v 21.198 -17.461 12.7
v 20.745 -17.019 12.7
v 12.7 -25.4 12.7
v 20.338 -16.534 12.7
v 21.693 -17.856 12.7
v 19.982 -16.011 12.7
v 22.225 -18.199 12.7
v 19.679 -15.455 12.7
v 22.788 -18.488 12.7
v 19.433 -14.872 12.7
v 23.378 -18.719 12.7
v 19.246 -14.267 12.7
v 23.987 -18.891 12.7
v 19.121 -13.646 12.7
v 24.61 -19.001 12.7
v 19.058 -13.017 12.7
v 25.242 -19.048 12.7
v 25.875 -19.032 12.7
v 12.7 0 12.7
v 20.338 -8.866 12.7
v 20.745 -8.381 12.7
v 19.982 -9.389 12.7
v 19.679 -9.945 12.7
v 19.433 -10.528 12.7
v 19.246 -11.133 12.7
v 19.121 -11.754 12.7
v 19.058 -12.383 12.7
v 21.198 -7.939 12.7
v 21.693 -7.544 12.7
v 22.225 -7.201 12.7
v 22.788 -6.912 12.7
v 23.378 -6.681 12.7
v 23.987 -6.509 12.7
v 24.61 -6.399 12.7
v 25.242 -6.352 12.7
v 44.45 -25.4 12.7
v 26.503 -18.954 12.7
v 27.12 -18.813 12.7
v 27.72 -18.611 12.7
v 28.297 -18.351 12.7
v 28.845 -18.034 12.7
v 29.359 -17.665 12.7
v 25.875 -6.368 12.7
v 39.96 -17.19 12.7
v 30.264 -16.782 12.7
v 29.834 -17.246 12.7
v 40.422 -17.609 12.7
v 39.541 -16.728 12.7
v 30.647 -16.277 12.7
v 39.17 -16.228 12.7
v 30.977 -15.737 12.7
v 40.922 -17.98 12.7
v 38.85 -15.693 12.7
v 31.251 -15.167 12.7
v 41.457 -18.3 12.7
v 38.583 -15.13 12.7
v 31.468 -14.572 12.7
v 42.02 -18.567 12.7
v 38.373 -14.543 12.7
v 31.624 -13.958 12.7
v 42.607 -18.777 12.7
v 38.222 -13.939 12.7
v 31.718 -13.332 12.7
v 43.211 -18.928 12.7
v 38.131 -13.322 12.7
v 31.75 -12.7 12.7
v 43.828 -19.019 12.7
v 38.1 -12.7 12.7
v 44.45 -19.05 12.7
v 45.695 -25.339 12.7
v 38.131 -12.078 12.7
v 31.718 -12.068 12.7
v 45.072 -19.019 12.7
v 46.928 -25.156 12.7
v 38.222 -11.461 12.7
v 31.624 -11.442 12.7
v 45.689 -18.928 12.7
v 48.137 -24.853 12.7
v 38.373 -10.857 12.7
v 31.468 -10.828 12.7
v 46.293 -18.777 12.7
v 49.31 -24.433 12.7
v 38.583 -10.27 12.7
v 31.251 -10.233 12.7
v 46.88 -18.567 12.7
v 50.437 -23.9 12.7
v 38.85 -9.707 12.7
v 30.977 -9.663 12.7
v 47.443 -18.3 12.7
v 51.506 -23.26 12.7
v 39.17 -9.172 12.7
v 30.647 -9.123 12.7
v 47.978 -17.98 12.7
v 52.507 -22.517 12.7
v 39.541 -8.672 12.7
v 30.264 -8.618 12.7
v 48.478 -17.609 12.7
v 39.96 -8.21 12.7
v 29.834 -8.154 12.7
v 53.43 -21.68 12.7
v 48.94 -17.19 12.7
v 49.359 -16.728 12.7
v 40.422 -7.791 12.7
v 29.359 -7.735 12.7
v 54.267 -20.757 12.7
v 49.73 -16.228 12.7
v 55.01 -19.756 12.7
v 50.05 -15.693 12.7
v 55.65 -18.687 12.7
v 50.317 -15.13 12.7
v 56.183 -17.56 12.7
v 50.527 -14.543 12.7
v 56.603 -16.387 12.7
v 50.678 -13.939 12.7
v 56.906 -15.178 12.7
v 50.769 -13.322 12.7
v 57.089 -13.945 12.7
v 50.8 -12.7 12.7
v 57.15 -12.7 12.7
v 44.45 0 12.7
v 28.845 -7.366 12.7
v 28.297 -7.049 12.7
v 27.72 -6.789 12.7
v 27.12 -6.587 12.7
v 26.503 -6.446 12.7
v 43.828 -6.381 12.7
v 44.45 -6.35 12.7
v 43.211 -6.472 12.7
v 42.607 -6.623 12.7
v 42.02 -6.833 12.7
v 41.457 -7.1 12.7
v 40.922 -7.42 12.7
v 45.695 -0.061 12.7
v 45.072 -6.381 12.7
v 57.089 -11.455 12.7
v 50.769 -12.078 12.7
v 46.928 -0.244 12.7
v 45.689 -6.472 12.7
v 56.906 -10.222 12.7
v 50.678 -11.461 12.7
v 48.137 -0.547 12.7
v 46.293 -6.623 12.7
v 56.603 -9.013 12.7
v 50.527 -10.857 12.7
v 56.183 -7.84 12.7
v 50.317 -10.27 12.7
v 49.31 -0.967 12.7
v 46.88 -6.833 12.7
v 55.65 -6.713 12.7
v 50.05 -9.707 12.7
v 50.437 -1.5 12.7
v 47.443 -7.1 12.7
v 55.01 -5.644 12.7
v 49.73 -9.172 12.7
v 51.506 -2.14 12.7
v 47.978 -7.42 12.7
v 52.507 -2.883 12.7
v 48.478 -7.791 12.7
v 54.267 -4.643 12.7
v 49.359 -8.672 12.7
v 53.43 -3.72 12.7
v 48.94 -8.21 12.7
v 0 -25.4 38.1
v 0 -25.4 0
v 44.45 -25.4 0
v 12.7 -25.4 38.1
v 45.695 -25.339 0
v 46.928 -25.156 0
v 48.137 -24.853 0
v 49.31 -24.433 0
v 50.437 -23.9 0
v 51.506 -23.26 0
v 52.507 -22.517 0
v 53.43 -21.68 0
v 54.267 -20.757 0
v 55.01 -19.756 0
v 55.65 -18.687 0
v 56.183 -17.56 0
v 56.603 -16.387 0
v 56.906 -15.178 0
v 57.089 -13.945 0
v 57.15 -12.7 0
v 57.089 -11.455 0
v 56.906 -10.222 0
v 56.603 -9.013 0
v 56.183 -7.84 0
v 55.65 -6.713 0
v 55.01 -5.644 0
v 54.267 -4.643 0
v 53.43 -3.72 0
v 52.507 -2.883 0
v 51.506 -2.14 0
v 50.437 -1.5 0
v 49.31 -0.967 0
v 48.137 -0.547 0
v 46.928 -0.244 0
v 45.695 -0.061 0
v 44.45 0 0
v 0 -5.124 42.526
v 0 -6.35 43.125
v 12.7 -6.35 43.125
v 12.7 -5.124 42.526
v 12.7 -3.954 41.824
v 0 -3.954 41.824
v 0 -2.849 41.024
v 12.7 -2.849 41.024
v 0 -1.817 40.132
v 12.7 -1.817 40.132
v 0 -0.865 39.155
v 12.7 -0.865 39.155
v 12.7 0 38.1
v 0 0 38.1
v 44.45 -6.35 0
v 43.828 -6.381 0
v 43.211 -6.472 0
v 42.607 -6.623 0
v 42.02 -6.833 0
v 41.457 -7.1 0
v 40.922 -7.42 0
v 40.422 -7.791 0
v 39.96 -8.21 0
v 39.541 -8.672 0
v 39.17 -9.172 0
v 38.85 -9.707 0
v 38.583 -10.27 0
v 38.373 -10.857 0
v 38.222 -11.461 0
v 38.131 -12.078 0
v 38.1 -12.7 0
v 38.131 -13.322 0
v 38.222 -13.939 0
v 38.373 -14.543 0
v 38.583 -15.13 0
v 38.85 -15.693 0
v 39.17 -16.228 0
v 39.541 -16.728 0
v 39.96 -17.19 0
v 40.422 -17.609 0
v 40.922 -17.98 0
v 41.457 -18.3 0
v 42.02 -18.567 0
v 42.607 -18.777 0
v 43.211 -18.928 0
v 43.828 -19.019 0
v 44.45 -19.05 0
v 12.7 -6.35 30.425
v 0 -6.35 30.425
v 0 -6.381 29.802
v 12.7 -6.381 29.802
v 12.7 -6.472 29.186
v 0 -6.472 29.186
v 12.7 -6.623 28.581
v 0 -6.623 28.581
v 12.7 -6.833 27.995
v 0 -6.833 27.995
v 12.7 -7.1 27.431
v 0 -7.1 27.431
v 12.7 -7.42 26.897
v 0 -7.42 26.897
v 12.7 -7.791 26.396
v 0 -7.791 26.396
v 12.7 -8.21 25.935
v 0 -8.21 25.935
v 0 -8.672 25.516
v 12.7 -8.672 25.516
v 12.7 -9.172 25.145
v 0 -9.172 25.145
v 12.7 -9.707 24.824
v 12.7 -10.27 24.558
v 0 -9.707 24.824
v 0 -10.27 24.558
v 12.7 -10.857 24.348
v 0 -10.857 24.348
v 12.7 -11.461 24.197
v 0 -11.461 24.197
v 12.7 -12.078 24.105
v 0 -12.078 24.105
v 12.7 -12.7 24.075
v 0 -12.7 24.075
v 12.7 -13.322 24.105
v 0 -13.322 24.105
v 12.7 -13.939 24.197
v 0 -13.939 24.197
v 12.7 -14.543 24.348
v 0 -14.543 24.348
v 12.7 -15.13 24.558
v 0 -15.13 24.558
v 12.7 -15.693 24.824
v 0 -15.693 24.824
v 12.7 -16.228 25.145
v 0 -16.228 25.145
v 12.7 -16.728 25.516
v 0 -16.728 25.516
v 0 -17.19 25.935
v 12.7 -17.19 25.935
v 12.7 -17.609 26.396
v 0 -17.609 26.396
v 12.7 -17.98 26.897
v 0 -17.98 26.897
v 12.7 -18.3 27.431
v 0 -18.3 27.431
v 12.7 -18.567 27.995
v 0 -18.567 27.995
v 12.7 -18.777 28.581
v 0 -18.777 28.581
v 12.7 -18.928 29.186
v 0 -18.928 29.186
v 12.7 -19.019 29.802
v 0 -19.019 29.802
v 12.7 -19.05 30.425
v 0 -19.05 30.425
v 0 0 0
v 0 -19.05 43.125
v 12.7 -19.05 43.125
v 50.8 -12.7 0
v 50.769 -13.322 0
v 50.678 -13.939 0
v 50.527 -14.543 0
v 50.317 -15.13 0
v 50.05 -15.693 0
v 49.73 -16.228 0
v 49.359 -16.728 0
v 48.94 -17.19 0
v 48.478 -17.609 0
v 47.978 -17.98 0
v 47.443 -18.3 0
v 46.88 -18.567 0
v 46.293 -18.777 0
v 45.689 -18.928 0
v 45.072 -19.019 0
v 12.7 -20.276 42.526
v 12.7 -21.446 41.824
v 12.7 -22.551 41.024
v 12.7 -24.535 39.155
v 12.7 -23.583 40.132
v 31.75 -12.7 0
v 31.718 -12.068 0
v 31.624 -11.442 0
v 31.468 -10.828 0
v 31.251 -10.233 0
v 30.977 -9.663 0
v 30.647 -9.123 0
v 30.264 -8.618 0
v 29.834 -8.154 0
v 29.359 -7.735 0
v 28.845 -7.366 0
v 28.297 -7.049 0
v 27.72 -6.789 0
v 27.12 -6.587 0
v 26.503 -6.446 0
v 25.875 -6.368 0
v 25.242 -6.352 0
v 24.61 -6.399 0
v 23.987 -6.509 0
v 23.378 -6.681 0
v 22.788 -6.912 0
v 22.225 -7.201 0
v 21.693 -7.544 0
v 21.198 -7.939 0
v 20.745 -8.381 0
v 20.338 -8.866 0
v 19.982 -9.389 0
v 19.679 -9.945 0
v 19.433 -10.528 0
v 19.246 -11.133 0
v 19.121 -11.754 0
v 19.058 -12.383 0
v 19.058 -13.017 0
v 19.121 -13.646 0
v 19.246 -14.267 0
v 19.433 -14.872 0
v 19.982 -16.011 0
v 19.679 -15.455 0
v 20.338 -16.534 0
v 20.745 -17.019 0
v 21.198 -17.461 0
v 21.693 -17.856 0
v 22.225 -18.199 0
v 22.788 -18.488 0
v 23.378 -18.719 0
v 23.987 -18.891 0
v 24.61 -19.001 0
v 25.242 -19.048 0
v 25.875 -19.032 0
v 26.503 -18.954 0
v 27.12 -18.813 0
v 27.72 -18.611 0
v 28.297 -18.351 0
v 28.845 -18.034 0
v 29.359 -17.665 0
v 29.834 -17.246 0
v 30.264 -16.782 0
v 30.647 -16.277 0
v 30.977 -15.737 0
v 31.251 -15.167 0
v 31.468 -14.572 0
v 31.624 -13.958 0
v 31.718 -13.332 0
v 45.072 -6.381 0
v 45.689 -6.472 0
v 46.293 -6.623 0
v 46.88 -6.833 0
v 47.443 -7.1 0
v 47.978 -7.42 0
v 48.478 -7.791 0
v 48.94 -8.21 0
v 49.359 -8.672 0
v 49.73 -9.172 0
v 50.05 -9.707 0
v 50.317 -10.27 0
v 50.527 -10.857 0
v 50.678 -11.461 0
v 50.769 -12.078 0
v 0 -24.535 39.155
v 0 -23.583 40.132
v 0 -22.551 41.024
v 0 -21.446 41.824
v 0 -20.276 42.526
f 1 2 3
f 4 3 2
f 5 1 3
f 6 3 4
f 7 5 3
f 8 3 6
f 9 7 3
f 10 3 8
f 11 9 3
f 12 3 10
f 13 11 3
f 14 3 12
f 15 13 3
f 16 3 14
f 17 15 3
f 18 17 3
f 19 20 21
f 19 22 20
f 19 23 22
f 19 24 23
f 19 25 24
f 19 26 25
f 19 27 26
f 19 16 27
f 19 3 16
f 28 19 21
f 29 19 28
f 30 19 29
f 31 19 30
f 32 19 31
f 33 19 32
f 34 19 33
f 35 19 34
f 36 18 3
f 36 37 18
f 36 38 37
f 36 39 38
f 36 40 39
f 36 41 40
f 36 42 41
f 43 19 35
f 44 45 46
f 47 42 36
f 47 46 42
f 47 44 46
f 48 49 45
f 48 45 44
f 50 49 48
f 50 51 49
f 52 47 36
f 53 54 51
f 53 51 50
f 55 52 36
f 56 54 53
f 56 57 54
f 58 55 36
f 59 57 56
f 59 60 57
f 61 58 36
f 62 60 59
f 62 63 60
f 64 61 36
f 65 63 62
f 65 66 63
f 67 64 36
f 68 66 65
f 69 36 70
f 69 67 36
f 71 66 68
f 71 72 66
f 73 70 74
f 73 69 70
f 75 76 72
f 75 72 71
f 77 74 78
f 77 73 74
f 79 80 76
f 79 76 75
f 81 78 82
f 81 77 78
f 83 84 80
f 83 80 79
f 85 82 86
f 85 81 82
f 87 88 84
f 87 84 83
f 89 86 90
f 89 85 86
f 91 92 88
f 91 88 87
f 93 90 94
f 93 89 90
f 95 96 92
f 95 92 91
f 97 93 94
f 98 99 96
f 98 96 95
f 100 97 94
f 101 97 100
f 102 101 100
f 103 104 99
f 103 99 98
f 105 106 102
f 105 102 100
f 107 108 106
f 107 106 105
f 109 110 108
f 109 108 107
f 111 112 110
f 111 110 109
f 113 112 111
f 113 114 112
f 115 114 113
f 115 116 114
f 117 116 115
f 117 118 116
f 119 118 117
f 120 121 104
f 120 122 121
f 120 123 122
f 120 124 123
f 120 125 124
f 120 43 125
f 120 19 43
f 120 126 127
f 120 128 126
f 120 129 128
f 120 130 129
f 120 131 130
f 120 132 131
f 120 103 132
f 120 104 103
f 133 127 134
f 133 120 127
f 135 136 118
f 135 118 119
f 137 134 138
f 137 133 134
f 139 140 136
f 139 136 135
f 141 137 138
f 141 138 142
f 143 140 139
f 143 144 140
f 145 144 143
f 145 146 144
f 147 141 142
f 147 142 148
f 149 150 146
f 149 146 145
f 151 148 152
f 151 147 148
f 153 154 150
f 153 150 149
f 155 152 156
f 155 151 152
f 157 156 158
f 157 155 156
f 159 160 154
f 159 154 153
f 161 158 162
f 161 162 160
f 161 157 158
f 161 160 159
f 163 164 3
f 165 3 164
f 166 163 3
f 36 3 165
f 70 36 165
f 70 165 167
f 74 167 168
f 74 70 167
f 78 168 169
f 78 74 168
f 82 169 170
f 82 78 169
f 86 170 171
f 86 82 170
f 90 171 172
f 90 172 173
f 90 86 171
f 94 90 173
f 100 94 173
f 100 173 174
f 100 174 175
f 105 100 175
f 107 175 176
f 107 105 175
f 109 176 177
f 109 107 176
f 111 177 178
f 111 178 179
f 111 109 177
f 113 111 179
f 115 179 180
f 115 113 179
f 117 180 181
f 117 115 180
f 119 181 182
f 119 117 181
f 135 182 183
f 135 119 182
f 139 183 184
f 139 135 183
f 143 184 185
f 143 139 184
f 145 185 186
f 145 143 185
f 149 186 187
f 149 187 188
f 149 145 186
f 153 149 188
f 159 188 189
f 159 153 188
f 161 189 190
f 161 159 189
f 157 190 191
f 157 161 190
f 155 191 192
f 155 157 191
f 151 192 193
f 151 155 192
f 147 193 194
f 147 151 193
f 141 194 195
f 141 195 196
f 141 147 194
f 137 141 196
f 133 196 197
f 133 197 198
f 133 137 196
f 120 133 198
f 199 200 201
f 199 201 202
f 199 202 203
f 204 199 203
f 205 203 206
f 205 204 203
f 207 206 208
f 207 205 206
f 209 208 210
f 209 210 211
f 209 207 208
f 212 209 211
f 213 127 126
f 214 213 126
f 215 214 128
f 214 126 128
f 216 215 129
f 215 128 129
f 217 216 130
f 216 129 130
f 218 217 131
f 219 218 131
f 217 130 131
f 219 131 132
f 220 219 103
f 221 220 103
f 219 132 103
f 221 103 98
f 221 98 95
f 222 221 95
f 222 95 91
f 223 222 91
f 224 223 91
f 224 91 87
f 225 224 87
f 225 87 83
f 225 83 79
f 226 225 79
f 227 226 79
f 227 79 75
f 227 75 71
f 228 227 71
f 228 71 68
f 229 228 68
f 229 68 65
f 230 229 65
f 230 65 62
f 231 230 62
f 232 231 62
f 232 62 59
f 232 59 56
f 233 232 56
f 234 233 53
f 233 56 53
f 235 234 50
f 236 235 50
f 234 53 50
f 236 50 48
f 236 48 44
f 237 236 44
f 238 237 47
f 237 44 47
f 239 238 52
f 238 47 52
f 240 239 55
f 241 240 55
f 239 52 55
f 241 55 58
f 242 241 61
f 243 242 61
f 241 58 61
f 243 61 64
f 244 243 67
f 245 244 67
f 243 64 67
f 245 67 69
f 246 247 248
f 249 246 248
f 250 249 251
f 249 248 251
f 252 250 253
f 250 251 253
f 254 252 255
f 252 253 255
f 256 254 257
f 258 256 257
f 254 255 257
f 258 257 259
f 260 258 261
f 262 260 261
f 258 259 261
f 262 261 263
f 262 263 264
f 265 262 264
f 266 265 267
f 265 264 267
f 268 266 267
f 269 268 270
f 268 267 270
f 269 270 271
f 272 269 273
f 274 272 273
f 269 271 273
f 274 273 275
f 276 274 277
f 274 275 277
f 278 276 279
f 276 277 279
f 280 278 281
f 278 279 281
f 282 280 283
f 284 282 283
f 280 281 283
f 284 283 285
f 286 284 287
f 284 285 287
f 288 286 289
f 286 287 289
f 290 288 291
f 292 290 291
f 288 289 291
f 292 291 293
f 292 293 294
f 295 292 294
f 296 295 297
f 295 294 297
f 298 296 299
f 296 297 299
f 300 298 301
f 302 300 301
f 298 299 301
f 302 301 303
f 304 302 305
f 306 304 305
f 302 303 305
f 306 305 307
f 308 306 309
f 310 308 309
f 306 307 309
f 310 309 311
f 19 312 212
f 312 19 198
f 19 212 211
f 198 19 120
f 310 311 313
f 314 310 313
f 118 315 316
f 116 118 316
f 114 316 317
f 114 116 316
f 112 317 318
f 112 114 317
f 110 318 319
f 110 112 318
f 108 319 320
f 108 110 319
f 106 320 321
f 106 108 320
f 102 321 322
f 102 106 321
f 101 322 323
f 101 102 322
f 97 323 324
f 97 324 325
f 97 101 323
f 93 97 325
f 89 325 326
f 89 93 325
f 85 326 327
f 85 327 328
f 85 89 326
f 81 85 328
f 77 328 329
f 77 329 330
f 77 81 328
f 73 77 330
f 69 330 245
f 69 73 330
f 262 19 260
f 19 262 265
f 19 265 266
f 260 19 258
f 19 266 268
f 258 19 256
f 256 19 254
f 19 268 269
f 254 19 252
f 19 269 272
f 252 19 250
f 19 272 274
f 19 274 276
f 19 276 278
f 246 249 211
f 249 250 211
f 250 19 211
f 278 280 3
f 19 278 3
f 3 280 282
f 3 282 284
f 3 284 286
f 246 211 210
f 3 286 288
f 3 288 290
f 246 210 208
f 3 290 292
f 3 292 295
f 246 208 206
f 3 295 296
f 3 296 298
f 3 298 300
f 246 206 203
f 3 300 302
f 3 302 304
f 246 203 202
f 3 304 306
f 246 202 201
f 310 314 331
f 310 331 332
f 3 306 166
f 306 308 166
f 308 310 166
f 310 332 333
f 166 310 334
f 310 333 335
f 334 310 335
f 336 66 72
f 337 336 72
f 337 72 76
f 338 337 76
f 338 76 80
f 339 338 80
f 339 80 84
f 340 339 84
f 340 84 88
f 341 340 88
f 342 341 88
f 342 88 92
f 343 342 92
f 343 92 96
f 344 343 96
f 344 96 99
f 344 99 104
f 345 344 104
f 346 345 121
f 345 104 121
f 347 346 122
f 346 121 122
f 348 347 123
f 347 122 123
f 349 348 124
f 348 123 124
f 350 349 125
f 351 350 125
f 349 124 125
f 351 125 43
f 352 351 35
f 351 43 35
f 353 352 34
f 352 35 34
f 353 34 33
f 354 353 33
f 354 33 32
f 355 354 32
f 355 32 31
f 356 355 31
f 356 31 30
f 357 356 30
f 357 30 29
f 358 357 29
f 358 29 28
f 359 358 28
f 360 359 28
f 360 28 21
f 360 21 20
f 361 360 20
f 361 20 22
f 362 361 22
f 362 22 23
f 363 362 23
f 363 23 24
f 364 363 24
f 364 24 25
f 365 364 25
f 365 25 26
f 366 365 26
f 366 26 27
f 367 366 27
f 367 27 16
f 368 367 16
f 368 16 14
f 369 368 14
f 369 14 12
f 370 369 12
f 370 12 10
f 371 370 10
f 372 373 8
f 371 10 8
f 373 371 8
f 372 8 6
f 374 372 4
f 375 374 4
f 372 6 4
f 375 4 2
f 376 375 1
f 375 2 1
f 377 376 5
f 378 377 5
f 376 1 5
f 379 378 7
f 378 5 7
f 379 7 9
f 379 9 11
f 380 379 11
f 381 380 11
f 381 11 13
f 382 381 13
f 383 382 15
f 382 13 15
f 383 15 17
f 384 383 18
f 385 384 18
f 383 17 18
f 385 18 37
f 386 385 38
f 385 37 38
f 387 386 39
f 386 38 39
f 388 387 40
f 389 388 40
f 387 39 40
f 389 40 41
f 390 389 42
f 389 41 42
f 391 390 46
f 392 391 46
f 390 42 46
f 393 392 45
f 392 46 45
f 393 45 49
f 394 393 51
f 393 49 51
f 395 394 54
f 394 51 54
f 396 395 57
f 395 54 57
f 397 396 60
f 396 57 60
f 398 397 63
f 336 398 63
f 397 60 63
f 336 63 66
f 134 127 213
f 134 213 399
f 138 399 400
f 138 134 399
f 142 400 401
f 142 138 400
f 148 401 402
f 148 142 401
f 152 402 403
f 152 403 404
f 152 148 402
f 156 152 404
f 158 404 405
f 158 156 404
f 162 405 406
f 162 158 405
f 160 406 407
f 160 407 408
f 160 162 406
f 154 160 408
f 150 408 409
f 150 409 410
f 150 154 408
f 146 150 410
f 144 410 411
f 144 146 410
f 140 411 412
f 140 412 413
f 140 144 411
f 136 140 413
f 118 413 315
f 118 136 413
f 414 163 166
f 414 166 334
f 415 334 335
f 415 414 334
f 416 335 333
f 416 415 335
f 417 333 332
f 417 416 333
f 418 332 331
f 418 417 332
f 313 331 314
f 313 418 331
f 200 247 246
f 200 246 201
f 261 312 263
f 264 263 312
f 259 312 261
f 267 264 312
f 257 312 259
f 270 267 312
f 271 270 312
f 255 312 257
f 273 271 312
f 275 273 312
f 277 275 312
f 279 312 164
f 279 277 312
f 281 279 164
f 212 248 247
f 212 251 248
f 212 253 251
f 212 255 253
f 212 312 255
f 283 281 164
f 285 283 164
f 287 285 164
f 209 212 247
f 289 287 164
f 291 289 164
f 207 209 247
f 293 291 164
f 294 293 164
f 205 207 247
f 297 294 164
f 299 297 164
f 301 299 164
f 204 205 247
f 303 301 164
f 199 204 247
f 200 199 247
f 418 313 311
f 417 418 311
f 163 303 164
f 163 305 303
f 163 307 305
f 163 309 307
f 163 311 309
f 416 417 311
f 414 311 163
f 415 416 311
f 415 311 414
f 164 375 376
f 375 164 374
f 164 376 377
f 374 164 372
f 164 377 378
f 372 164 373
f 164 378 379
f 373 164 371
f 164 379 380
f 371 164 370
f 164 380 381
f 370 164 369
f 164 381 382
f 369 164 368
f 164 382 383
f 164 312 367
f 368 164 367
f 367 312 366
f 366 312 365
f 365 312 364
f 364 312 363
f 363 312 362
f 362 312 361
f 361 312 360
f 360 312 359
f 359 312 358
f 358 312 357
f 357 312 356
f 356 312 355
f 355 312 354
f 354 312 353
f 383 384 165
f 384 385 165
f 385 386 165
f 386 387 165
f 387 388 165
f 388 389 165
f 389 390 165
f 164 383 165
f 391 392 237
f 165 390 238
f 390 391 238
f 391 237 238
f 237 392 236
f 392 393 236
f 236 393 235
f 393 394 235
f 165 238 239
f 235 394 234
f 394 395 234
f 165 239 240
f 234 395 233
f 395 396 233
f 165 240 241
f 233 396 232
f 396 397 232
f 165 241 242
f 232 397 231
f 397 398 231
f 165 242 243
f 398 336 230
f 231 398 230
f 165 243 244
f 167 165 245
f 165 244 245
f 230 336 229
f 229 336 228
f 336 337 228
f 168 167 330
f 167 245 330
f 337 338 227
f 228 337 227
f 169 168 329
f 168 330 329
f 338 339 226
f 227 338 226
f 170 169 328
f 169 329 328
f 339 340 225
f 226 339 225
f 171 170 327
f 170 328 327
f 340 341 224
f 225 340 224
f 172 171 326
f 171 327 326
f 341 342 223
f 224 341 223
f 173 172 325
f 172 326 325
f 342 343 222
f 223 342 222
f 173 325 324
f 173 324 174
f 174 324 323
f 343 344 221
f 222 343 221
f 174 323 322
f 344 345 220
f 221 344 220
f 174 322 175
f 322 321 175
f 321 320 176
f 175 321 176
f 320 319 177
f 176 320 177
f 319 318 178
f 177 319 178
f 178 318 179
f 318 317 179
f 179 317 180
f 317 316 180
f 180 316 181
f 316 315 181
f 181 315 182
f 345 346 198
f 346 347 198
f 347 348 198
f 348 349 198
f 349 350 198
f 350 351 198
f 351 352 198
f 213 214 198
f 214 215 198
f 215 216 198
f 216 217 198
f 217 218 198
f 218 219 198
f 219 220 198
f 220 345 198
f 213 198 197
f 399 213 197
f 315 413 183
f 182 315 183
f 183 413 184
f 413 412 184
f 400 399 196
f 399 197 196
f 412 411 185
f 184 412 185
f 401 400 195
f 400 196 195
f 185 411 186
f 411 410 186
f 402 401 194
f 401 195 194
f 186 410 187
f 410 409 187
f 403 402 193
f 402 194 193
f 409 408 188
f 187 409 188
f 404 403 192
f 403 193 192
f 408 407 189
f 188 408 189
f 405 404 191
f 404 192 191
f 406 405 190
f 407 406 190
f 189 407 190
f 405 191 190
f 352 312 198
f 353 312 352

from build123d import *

# Parameters (mm, degrees)
F1_DEPTH = 25.4
F2_W     = 12.7
F2_H     = 7.675322
F3_DEPTH = 12.7
F4_DEPTH = 12.7
F5_R     = 6.35
F6_DEPTH = 25.4
F7_DEPTH = 12.7


with BuildPart() as f1:
    # F0 (on Front) → F1 (new body)
    with BuildSketch(Plane.XZ):
        Polygon((0, 38.1), (0, 0), (44.45, 0), (44.45, 12.7), (12.7, 12.7), (12.7, 38.1), align=None)
    extrude(amount=F1_DEPTH)

    # F2 (on face) → F3 (cut)
    with BuildSketch(Plane(origin=(0, 0, 0), x_dir=(0, -1, 0), z_dir=(-1, 0, 0))):
        with BuildLine():
            Line((6.35, 38.1), (6.35, 43.124678))
            ThreePointArc((6.35, 43.124678), (2.84924, 41.024022), (0, 38.1))
            Line((0, 38.1), (6.35, 38.1))
        make_face()
        with Locations((12.7, 34.262339)):
            Rectangle(F2_W, F2_H)
        with BuildLine():
            ThreePointArc((6.35, 30.424678), (12.7, 24.074678), (19.05, 30.424678))
            Line((19.05, 30.424678), (6.35, 30.424678))
        make_face()
    extrude(amount=-F3_DEPTH, mode=Mode.SUBTRACT)

    # F2 (on face) → F4 (join)
    with BuildSketch(Plane(origin=(0, 0, 0), x_dir=(0, -1, 0), z_dir=(-1, 0, 0))):
        with BuildLine():
            Line((6.35, 38.1), (6.35, 43.124678))
            ThreePointArc((6.35, 43.124678), (2.84924, 41.024022), (0, 38.1))
            Line((0, 38.1), (6.35, 38.1))
        make_face()
        with BuildLine():
            Line((19.05, 38.1), (25.4, 38.1))
            ThreePointArc((25.4, 38.1), (22.55076, 41.024022), (19.05, 43.124678))
            Line((19.05, 43.124678), (19.05, 38.1))
        make_face()
    extrude(amount=-F4_DEPTH)

    # F5 (on face) → F6 (cut)
    with BuildSketch(Plane.XY.offset(12.7)):
        with BuildLine():
            Line((44.45, -6.35), (44.45, -19.05))
            ThreePointArc((44.45, -19.05), (48.940128, -17.190128), (50.8, -12.7))
            ThreePointArc((50.8, -12.7), (48.940128, -8.209872), (44.45, -6.35))
        make_face()
        with BuildLine():
            ThreePointArc((44.45, -6.35), (38.1, -12.7), (44.45, -19.05))
            Line((44.45, -19.05), (44.45, -6.35))
        make_face()
        with Locations((25.4, -12.7)):
            Circle(F5_R)
    extrude(amount=-F6_DEPTH, mode=Mode.SUBTRACT)

    # F5 (on face) → F7 (join)
    with BuildSketch(Plane.XY.offset(12.7)):
        with BuildLine():
            Line((44.45, -19.05), (44.45, -25.4))
            ThreePointArc((44.45, -25.4), (57.15, -12.7), (44.45, 0))
            Line((44.45, 0), (44.45, -6.35))
            ThreePointArc((44.45, -6.35), (48.940128, -8.209872), (50.8, -12.7))
            ThreePointArc((50.8, -12.7), (48.940128, -17.190128), (44.45, -19.05))
        make_face()
    extrude(amount=-F7_DEPTH)


solid = f1.part
